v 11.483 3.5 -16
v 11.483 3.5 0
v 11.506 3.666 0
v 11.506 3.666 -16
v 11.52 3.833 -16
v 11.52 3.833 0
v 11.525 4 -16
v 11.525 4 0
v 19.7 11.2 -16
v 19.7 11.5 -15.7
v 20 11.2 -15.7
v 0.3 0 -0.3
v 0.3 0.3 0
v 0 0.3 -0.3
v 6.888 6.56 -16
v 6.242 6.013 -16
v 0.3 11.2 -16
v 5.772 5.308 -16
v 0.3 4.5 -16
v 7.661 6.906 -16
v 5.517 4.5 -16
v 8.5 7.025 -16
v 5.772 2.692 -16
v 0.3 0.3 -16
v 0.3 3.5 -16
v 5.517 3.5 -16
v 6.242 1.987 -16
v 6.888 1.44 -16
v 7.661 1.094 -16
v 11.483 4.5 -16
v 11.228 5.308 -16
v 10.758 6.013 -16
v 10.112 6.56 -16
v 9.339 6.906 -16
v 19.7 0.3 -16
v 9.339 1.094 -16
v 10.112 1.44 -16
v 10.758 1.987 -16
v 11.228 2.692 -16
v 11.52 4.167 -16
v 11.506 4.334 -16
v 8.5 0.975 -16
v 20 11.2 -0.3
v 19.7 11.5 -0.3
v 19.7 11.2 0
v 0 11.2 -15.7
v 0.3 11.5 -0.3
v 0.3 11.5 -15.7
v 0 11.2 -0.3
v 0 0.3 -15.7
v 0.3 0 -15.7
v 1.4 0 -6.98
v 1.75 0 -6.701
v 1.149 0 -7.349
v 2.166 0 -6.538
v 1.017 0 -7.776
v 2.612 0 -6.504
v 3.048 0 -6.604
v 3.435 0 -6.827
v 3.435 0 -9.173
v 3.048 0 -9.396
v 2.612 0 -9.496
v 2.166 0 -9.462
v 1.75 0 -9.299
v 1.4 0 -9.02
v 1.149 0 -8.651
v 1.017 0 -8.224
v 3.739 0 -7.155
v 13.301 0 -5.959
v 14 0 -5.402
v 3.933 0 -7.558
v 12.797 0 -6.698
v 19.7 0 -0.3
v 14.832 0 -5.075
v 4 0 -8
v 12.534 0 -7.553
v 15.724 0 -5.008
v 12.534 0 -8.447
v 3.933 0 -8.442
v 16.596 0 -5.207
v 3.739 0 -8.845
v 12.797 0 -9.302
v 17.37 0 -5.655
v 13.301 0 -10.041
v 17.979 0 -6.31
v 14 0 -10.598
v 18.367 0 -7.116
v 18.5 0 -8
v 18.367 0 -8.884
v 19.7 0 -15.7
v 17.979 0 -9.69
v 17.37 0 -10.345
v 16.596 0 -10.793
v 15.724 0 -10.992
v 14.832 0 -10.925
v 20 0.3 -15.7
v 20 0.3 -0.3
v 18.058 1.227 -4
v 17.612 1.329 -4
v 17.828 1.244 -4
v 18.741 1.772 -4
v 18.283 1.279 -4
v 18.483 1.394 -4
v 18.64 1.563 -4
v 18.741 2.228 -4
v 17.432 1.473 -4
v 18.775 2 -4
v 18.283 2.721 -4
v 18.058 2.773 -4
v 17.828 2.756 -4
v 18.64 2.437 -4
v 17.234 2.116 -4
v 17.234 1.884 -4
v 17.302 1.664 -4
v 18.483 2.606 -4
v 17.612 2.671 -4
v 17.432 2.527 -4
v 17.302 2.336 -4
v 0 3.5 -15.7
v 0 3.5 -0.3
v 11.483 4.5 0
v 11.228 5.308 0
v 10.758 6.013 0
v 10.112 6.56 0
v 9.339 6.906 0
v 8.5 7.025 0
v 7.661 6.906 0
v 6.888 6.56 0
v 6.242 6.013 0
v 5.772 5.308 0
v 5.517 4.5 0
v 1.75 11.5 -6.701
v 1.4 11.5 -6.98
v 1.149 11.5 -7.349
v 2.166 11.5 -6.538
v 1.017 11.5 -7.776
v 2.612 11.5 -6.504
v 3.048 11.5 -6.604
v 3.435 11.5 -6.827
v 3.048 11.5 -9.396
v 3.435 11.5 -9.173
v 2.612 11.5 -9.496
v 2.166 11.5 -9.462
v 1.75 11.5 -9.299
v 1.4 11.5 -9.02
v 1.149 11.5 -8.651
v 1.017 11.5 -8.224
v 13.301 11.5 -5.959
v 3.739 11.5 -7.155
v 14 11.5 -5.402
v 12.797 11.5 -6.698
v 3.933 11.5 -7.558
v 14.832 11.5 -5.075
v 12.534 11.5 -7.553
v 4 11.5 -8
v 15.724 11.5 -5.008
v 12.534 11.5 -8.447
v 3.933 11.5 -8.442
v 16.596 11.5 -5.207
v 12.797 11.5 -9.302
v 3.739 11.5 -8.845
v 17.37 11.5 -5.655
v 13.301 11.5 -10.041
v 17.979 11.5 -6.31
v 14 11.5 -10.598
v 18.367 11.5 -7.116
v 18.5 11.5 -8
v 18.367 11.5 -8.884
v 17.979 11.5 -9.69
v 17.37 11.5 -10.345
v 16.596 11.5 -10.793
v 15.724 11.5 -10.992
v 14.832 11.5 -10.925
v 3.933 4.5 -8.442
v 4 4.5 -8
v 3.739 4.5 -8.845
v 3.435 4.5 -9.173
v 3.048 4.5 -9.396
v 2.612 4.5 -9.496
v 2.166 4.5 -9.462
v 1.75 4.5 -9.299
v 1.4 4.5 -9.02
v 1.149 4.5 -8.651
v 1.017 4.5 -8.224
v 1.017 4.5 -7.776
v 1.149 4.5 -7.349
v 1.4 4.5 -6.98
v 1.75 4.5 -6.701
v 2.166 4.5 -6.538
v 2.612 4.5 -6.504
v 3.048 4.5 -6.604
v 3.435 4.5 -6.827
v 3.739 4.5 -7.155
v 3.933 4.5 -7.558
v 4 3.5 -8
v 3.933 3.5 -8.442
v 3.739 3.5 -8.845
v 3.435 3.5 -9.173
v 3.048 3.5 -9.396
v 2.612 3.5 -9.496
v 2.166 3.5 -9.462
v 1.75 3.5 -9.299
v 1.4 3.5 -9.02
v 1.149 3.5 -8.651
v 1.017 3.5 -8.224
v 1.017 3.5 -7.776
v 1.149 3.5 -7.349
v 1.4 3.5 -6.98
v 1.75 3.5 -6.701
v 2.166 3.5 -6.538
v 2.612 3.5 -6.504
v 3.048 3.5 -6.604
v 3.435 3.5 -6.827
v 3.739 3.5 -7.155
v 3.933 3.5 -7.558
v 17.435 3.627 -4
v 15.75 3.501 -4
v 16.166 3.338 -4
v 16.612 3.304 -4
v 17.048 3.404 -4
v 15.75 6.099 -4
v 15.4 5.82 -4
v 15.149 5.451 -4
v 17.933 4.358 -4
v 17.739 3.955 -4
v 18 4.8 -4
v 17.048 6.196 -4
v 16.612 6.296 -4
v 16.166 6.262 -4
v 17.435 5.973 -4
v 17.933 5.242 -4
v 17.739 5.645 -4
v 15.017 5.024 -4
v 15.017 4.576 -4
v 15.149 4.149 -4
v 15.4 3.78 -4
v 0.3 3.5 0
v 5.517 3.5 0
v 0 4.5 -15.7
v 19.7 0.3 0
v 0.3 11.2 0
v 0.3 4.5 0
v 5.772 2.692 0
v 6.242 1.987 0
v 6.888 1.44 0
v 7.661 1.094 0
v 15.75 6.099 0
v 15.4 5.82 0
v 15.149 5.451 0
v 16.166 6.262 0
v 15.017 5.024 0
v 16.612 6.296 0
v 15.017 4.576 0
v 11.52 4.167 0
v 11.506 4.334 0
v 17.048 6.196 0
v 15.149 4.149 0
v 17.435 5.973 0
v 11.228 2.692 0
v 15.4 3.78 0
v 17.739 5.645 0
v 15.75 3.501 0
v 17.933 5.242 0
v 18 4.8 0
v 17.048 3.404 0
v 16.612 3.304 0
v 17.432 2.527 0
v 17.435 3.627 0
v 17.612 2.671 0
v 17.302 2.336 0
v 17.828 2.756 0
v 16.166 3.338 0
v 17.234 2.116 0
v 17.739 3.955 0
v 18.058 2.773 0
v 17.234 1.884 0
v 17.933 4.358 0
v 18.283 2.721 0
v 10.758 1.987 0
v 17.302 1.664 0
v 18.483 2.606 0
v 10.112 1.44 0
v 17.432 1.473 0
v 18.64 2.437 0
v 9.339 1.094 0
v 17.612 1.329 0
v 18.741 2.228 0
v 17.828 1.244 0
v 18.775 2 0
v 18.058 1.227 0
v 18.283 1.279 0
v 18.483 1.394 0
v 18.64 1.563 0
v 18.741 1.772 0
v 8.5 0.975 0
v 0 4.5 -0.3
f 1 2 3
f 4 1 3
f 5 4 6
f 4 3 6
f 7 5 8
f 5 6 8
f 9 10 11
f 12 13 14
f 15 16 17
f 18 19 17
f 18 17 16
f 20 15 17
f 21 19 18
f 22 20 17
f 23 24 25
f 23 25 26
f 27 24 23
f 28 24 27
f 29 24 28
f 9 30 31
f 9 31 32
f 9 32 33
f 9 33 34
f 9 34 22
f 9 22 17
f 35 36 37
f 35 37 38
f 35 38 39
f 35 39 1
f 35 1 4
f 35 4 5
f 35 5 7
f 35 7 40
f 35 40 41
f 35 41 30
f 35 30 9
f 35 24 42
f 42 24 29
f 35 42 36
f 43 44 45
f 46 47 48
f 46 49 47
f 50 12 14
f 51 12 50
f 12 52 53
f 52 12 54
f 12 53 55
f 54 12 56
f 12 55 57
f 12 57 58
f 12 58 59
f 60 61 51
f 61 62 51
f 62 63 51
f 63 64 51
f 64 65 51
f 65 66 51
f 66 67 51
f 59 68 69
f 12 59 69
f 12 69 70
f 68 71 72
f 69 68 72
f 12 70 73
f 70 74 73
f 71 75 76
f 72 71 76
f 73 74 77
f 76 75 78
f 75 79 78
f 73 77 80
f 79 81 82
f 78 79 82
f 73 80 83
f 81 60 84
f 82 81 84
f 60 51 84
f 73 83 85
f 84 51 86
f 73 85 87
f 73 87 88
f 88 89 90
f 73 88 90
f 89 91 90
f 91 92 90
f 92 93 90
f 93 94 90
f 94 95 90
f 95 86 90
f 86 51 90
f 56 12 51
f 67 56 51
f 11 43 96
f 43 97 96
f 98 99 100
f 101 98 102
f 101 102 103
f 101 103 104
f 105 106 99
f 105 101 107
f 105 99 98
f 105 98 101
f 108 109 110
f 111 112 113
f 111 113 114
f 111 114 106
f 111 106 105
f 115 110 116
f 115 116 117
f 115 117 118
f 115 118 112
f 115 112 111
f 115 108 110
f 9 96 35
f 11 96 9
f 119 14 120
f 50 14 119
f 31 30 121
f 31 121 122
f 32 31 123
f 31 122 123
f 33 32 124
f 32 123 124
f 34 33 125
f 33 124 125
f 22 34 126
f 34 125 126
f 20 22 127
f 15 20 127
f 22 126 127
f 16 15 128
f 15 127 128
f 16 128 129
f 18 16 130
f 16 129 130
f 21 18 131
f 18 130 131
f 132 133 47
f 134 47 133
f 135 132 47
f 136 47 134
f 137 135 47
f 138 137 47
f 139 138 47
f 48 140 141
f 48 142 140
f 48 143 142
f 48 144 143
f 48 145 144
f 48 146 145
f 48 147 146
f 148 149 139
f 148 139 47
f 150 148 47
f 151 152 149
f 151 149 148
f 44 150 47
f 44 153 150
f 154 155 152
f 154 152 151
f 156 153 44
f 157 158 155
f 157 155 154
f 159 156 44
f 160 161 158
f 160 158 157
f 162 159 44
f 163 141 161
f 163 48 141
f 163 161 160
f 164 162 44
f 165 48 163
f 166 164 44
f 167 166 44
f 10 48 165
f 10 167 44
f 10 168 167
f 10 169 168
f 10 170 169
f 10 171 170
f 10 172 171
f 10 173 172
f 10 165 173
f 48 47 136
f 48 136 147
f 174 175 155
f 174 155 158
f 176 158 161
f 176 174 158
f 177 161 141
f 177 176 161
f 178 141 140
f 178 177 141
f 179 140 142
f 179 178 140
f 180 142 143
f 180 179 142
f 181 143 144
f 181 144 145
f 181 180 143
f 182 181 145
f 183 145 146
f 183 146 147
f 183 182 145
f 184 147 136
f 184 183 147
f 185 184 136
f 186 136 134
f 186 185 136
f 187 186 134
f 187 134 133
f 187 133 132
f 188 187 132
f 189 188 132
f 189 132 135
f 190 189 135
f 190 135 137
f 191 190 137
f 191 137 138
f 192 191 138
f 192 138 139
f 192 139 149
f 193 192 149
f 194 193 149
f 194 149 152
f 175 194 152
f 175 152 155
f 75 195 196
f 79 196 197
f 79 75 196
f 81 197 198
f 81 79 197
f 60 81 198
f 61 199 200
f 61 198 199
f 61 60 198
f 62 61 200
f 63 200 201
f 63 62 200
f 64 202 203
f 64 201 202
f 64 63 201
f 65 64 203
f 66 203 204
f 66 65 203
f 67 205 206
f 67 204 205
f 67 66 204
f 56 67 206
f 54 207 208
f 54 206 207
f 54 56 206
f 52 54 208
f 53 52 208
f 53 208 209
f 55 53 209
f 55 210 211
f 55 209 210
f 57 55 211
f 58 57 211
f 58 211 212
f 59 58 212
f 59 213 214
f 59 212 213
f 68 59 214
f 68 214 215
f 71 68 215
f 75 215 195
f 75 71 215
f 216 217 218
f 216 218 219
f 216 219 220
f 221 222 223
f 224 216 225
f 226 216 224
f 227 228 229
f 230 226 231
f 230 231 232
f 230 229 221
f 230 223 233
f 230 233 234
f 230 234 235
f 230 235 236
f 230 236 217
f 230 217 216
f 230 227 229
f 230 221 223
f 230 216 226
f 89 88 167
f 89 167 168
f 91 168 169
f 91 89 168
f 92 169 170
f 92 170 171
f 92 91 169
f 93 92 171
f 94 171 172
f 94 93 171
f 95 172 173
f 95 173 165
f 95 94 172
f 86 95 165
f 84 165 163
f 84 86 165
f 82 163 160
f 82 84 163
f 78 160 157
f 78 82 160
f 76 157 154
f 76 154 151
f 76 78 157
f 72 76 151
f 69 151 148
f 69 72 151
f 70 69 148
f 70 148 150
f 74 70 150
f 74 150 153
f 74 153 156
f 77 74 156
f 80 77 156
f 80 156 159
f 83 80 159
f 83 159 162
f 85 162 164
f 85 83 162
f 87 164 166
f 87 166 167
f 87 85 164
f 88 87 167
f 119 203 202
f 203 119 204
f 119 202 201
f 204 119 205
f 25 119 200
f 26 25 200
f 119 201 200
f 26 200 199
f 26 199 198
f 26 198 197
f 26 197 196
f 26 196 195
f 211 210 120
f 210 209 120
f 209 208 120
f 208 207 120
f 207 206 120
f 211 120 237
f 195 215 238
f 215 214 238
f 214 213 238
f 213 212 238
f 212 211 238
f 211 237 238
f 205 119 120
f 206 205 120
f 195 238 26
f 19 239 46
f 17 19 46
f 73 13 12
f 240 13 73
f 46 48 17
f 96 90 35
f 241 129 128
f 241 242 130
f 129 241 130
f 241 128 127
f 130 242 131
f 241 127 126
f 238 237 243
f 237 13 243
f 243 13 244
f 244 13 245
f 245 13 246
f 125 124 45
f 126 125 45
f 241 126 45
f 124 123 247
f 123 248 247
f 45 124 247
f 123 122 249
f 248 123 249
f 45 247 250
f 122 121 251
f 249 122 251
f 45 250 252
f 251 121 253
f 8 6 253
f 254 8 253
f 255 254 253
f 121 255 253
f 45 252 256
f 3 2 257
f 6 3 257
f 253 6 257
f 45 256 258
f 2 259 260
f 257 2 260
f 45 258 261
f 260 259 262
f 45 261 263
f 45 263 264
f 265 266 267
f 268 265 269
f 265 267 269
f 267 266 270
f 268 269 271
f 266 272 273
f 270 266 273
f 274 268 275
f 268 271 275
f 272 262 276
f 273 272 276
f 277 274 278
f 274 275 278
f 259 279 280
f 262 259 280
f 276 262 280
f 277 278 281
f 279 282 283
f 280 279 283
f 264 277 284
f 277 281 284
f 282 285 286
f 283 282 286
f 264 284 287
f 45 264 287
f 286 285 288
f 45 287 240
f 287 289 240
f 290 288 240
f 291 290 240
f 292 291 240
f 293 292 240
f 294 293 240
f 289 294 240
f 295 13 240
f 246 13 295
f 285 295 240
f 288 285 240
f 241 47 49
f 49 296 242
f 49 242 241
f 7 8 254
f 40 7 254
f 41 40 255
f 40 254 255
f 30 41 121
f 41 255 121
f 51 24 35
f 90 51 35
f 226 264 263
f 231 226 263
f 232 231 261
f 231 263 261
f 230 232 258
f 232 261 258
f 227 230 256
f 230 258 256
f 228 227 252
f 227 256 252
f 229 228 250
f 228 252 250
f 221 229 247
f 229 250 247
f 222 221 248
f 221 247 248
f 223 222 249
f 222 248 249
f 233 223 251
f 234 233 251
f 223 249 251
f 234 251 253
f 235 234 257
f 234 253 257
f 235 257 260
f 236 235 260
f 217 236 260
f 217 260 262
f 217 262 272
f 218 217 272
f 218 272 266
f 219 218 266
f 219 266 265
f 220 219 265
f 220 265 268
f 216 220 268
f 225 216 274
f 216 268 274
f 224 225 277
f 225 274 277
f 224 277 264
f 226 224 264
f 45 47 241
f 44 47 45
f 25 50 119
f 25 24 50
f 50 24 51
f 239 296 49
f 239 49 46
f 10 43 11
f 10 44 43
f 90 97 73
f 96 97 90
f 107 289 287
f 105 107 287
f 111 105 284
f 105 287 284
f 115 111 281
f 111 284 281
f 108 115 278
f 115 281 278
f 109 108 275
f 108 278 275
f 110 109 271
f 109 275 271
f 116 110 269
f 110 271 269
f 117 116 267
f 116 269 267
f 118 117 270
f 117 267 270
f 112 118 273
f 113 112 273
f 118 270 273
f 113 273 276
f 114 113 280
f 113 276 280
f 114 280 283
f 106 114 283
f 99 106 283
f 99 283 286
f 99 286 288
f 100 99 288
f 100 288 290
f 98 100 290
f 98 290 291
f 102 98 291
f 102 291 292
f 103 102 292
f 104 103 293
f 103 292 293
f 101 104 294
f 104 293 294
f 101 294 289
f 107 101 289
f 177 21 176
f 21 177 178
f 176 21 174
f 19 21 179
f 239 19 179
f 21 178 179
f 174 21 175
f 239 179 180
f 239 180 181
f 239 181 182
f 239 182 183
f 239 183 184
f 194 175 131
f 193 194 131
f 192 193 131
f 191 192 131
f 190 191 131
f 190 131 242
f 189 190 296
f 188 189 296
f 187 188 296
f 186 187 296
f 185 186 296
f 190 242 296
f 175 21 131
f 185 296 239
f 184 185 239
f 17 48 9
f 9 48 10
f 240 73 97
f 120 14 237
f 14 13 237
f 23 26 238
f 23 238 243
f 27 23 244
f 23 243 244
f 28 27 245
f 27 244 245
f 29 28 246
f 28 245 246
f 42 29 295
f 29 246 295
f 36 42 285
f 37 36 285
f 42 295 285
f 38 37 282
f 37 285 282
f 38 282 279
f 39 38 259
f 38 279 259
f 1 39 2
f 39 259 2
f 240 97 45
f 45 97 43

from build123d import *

# Parameters (mm, degrees)
SKETCH1_W           = 20
SKETCH1_H           = 16
SKETCH1_R           = 3
SKETCH1_R_2         = 1.5
BOSS_EXTRUDE1_DEPTH = 11.5
CUT_EXTRUDE1_DEPTH  = 17
SKETCH3_R           = 1.5
SKETCH3_R_2         = 0.775
CUT_EXTRUDE2_DEPTH  = 4
CHAMFER1_SIZE       = 0.3


with BuildPart() as part:
    # Sketch1 → Boss-Extrude1 (new body)
    with BuildSketch(Plane(origin=(0, 0, 0), x_dir=(1, 0, 0), z_dir=(0, 1, 0))):
        with Locations((10, 8)):
            Rectangle(SKETCH1_W, SKETCH1_H)
        with Locations((15.5, 8)):
            Circle(SKETCH1_R, mode=Mode.SUBTRACT)
        with Locations((2.5, 8)):
            Circle(SKETCH1_R_2, mode=Mode.SUBTRACT)
    extrude(amount=BOSS_EXTRUDE1_DEPTH)

    # Sketch2 → Cut-Extrude1 (cut, through all)
    with BuildSketch(Plane.XY):
        with BuildLine():
            Line((5.516608474, 4.5), (11.483391526, 4.5))
            ThreePointArc((11.483391526, 4.5), (8.5, 7.025), (5.516608474, 4.5))
        make_face()
        with BuildLine():
            Line((5.516608474, 3.5), (11.483391526, 3.5))
            ThreePointArc((11.483391526, 3.5), (11.514579935, 3.749135861), (11.525, 4))
            ThreePointArc((11.525, 4), (11.514579935, 4.250864139), (11.483391526, 4.5))
            Line((11.483391526, 4.5), (5.516608474, 4.5))
            ThreePointArc((5.516608474, 4.5), (5.475, 4), (5.516608474, 3.5))
        make_face()
        with BuildLine():
            ThreePointArc((5.516608474, 3.5), (8.5, 0.975), (11.483391526, 3.5))
            Line((11.483391526, 3.5), (5.516608474, 3.5))
        make_face()
        with BuildLine():
            Line((0, 3.5), (5.516608474, 3.5))
            ThreePointArc((5.516608474, 3.5), (5.475, 4), (5.516608474, 4.5))
            Line((5.516608474, 4.5), (0, 4.5))
            Line((0, 4.5), (0, 3.5))
        make_face()
    extrude(amount=-CUT_EXTRUDE1_DEPTH, mode=Mode.SUBTRACT)

    # Sketch3 → Cut-Extrude2 (cut)
    with BuildSketch(Plane.XY):
        with Locations((16.5, 4.8)):
            Circle(SKETCH3_R)
        with Locations((18, 2)):
            Circle(SKETCH3_R_2)
    extrude(amount=-CUT_EXTRUDE2_DEPTH, mode=Mode.SUBTRACT)

    # Chamfer1
    chamfer1_edges = [part.edges().sort_by_distance(p)[0] for p in [
        (20, 11.5, -8),
        (10, 11.5, -16),
        (0, 1.75, -16),
        (0, 1.75, 0),
        (0, 11.5, -8),
        (10, 0, -16),
        (20, 0, -8),
        (10, 0, 0),
        (0, 0, -8),
        (10, 11.5, 0),
        (0, 8, -16),
        (20, 5.75, -16),
        (20, 5.75, 0),
        (0, 8, 0),
    ]]
    chamfer(chamfer1_edges, length=CHAMFER1_SIZE)


solid = part.part
